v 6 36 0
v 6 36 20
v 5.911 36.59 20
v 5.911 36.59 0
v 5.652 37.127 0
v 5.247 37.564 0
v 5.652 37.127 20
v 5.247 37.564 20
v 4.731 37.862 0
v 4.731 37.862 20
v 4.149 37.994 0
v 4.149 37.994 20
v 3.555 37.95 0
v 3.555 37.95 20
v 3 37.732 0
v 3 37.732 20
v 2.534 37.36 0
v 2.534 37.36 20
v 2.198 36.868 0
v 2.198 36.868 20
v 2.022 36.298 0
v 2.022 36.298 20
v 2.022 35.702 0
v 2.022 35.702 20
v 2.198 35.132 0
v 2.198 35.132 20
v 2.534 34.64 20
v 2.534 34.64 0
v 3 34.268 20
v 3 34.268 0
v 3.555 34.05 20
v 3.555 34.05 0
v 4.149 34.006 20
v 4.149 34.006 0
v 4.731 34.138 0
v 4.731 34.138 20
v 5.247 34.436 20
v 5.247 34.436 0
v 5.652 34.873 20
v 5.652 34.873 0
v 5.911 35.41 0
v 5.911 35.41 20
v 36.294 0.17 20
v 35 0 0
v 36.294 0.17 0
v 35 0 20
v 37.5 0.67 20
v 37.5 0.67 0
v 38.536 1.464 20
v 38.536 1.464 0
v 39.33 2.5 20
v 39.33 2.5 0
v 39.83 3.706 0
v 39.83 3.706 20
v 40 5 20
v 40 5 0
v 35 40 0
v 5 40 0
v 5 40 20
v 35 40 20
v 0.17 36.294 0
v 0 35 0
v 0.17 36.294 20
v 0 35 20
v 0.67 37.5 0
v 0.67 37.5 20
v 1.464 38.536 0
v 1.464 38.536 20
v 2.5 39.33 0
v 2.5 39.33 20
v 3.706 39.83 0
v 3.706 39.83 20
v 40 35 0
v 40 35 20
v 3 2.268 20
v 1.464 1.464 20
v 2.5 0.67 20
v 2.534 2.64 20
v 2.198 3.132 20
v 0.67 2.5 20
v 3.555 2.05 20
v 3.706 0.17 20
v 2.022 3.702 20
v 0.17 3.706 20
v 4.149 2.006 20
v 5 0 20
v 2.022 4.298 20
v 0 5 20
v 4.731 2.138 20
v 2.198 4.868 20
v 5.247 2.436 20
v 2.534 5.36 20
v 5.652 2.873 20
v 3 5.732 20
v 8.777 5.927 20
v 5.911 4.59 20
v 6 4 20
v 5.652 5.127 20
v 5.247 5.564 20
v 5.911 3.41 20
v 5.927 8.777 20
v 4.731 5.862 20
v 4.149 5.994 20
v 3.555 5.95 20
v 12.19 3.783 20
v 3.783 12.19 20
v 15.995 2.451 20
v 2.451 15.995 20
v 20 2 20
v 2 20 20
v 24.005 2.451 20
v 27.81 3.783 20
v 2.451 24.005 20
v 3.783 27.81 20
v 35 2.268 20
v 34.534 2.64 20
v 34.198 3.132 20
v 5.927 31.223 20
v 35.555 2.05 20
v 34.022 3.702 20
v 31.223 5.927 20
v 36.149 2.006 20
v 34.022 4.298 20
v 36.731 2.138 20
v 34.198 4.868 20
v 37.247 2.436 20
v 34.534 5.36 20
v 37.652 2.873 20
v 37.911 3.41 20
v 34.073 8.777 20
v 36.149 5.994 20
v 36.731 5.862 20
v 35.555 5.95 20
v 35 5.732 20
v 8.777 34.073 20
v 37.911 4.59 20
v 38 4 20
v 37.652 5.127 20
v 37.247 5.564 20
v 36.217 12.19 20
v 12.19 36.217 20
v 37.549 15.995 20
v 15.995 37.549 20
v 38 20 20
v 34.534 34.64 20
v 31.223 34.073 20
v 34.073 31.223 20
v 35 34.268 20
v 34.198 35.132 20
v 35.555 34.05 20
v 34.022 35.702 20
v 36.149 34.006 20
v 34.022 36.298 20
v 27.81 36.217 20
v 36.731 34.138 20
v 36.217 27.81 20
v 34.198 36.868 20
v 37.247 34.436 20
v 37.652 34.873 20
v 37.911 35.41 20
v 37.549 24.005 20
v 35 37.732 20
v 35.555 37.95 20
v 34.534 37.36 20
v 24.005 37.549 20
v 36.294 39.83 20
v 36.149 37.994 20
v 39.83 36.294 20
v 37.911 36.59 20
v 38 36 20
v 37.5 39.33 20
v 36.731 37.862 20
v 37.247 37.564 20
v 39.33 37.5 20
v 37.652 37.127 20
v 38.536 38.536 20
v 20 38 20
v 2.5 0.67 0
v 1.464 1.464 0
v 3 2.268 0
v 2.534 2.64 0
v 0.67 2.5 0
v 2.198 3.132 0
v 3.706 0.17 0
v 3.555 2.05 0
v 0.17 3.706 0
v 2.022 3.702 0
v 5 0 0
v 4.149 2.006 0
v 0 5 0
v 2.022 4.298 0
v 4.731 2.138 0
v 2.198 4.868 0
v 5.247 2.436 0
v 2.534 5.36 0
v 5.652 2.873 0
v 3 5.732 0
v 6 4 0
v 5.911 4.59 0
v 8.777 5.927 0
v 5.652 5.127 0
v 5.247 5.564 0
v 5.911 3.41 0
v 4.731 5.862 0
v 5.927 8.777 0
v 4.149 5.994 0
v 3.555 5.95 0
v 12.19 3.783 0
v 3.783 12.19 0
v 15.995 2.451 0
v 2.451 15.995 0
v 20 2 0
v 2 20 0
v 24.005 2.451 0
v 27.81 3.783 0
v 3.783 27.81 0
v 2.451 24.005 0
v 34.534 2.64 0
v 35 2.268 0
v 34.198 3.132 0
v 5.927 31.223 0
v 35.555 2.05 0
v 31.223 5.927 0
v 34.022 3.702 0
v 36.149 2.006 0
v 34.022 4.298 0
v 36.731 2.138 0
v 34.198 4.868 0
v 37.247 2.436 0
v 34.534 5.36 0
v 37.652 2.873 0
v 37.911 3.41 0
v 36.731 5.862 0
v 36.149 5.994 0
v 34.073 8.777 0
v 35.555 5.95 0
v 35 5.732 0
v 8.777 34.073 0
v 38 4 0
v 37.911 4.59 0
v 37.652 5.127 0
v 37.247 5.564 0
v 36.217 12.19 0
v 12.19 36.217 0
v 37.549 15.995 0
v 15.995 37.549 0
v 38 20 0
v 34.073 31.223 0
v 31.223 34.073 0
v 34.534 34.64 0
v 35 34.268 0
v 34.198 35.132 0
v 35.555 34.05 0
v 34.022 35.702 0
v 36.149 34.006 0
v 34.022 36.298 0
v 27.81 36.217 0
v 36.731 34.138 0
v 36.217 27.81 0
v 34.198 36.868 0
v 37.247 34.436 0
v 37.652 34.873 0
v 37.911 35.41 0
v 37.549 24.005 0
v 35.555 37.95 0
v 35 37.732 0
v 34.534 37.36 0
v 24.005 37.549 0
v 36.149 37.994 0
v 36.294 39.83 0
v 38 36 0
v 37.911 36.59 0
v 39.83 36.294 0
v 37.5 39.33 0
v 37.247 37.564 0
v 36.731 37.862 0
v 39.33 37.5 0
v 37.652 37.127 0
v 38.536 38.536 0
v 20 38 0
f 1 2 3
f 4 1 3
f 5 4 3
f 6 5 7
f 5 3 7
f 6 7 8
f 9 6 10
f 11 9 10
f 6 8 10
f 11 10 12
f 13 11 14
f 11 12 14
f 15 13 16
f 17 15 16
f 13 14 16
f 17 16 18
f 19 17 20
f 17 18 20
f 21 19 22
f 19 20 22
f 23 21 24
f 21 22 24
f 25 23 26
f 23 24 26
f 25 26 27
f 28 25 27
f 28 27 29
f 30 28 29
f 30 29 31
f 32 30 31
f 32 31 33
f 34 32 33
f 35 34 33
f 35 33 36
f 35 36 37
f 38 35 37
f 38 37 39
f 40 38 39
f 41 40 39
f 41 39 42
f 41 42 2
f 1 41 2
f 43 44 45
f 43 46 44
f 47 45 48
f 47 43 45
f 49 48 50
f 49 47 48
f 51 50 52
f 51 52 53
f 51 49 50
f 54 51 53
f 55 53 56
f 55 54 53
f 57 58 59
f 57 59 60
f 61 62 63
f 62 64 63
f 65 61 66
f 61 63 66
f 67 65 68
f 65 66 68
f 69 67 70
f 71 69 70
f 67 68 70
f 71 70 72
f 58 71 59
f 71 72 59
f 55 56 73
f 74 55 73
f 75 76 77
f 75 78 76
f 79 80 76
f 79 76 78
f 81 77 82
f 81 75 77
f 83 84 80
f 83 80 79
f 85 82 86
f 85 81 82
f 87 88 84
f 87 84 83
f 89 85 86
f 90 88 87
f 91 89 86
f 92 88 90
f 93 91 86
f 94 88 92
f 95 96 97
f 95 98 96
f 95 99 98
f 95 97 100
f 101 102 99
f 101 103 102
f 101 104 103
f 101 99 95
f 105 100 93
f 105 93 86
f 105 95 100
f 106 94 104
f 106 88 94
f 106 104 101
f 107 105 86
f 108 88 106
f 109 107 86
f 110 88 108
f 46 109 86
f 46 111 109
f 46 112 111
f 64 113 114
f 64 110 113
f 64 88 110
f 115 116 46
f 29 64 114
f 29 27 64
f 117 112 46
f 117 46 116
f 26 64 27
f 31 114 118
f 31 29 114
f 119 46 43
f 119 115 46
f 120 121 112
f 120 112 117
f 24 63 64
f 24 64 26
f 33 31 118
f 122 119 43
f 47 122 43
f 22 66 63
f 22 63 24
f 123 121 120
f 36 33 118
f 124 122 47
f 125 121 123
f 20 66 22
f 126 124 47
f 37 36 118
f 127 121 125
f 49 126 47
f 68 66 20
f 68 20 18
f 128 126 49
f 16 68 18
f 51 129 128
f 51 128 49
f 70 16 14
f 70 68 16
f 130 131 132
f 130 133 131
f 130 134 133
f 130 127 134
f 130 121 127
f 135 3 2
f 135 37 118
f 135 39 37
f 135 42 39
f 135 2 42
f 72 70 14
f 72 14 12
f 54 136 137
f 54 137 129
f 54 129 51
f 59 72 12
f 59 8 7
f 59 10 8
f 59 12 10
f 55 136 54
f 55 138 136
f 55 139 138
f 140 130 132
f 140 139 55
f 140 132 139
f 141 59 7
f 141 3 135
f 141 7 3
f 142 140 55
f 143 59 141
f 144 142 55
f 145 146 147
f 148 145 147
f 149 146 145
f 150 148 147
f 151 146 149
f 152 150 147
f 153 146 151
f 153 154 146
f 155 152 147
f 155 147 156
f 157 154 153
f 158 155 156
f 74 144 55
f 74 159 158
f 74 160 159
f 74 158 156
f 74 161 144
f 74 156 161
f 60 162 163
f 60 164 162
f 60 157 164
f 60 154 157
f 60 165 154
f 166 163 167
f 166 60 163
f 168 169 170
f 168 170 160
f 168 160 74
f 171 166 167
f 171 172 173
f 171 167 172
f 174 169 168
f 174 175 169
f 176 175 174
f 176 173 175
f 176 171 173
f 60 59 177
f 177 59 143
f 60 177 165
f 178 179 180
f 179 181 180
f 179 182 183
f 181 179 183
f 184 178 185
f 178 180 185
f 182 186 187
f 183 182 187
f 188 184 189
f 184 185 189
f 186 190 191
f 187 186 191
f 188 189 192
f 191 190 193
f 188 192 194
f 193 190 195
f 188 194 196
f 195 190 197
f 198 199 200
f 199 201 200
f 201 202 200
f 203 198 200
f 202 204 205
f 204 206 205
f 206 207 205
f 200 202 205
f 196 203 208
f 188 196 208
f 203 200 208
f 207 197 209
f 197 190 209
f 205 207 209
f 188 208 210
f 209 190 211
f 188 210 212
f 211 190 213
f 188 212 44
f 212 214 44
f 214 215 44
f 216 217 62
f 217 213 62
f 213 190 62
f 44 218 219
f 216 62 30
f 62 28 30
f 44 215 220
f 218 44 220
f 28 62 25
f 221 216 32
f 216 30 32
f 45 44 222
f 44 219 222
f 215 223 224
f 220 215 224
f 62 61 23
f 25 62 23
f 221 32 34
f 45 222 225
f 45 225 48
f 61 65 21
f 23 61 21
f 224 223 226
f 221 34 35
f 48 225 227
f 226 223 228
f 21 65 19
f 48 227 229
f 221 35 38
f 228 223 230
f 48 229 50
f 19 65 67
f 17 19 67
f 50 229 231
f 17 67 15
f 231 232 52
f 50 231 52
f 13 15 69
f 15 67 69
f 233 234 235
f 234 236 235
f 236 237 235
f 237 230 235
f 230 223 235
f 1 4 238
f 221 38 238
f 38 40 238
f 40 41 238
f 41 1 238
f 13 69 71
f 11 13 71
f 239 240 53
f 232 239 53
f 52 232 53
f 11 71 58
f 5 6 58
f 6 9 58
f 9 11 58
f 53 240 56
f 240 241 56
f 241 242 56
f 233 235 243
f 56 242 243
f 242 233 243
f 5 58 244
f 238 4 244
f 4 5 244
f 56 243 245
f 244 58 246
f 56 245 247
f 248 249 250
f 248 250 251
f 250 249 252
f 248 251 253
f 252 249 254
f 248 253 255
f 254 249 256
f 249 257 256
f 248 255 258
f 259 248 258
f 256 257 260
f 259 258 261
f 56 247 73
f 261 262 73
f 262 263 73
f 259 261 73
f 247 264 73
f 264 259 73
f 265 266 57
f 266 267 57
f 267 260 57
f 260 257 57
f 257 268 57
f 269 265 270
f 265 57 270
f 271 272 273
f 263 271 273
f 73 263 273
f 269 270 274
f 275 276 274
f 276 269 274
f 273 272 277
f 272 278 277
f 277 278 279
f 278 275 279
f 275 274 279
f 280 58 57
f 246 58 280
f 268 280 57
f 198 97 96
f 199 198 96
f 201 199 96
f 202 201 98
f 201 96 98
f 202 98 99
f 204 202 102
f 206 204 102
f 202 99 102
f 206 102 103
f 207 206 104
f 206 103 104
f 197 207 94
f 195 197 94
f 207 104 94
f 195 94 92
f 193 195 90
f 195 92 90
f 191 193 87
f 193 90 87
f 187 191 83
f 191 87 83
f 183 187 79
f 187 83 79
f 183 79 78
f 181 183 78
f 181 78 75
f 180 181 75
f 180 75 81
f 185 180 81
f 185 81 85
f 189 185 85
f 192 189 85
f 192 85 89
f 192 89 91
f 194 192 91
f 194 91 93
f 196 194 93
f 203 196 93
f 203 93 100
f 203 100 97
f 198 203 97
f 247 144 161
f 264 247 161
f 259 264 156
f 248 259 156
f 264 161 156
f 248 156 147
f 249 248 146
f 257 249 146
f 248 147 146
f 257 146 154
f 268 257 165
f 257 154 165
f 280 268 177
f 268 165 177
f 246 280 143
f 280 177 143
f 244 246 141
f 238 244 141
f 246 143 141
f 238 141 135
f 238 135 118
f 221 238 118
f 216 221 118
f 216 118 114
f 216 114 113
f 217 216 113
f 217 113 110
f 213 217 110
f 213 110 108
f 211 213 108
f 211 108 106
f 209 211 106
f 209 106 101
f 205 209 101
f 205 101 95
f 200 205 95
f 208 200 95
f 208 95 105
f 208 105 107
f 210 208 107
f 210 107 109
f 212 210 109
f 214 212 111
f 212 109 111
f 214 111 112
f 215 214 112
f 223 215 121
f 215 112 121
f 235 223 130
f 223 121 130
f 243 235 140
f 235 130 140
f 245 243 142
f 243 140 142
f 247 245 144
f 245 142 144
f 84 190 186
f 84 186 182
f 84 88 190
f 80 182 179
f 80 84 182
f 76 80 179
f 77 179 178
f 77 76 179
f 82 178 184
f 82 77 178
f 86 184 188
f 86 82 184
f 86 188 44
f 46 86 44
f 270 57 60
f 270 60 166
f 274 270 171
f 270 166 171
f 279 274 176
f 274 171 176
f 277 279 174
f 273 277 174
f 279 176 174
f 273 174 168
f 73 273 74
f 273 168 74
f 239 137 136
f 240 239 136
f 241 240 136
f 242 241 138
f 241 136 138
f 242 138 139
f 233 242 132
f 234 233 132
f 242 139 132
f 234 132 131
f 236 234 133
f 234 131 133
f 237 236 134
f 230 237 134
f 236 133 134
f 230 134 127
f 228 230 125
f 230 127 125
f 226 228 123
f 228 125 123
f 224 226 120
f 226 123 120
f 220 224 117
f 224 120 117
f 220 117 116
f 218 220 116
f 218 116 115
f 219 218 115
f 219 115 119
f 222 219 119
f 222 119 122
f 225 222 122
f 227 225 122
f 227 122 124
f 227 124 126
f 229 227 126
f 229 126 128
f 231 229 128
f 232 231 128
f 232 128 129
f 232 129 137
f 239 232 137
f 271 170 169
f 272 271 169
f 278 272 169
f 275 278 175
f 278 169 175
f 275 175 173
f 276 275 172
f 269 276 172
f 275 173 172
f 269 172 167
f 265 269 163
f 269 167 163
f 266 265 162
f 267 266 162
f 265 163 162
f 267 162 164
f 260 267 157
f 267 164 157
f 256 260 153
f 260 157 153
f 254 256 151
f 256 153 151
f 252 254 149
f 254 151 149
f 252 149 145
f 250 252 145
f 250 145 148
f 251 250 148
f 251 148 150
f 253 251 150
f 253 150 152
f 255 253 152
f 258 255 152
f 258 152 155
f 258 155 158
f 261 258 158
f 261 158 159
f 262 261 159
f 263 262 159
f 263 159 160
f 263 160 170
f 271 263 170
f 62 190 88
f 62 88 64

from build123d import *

# Parameters (mm, degrees)
F0_W     = 40
F0_H     = 40
F1_DEPTH = 20
F2_R     = 2
F3_DEPTH = 25
F4_R     = 18
F5_DEPTH = 25
F6_R     = 5


with BuildPart() as f1:
    # F0 (on Top) → F1 (new body)
    with BuildSketch(Plane.XY):
        with Locations((20, 20)):
            Rectangle(F0_W, F0_H)
    extrude(amount=F1_DEPTH)

    # F2 (on face) → F3 (cut)
    with BuildSketch(Plane.XY.offset(20)):
        with Locations((4, 36)):
            Circle(F2_R)
        with Locations((36, 36)):
            Circle(F2_R)
        with Locations((36, 4)):
            Circle(F2_R)
        with Locations((4, 4)):
            Circle(F2_R)
    extrude(amount=-F3_DEPTH, mode=Mode.SUBTRACT)

    # F4 (on face) → F5 (cut)
    with BuildSketch(Plane.XY.offset(20)):
        with Locations((20, 20)):
            Circle(F4_R)
    extrude(amount=-F5_DEPTH, mode=Mode.SUBTRACT)

    # F6
    f6_edges = [f1.edges().sort_by_distance(p)[0] for p in [
        (0, 0, 10),
        (0, 40, 10),
        (40, 40, 10),
        (40, 0, 10),
    ]]
    fillet(f6_edges, radius=F6_R)


solid = f1.part
